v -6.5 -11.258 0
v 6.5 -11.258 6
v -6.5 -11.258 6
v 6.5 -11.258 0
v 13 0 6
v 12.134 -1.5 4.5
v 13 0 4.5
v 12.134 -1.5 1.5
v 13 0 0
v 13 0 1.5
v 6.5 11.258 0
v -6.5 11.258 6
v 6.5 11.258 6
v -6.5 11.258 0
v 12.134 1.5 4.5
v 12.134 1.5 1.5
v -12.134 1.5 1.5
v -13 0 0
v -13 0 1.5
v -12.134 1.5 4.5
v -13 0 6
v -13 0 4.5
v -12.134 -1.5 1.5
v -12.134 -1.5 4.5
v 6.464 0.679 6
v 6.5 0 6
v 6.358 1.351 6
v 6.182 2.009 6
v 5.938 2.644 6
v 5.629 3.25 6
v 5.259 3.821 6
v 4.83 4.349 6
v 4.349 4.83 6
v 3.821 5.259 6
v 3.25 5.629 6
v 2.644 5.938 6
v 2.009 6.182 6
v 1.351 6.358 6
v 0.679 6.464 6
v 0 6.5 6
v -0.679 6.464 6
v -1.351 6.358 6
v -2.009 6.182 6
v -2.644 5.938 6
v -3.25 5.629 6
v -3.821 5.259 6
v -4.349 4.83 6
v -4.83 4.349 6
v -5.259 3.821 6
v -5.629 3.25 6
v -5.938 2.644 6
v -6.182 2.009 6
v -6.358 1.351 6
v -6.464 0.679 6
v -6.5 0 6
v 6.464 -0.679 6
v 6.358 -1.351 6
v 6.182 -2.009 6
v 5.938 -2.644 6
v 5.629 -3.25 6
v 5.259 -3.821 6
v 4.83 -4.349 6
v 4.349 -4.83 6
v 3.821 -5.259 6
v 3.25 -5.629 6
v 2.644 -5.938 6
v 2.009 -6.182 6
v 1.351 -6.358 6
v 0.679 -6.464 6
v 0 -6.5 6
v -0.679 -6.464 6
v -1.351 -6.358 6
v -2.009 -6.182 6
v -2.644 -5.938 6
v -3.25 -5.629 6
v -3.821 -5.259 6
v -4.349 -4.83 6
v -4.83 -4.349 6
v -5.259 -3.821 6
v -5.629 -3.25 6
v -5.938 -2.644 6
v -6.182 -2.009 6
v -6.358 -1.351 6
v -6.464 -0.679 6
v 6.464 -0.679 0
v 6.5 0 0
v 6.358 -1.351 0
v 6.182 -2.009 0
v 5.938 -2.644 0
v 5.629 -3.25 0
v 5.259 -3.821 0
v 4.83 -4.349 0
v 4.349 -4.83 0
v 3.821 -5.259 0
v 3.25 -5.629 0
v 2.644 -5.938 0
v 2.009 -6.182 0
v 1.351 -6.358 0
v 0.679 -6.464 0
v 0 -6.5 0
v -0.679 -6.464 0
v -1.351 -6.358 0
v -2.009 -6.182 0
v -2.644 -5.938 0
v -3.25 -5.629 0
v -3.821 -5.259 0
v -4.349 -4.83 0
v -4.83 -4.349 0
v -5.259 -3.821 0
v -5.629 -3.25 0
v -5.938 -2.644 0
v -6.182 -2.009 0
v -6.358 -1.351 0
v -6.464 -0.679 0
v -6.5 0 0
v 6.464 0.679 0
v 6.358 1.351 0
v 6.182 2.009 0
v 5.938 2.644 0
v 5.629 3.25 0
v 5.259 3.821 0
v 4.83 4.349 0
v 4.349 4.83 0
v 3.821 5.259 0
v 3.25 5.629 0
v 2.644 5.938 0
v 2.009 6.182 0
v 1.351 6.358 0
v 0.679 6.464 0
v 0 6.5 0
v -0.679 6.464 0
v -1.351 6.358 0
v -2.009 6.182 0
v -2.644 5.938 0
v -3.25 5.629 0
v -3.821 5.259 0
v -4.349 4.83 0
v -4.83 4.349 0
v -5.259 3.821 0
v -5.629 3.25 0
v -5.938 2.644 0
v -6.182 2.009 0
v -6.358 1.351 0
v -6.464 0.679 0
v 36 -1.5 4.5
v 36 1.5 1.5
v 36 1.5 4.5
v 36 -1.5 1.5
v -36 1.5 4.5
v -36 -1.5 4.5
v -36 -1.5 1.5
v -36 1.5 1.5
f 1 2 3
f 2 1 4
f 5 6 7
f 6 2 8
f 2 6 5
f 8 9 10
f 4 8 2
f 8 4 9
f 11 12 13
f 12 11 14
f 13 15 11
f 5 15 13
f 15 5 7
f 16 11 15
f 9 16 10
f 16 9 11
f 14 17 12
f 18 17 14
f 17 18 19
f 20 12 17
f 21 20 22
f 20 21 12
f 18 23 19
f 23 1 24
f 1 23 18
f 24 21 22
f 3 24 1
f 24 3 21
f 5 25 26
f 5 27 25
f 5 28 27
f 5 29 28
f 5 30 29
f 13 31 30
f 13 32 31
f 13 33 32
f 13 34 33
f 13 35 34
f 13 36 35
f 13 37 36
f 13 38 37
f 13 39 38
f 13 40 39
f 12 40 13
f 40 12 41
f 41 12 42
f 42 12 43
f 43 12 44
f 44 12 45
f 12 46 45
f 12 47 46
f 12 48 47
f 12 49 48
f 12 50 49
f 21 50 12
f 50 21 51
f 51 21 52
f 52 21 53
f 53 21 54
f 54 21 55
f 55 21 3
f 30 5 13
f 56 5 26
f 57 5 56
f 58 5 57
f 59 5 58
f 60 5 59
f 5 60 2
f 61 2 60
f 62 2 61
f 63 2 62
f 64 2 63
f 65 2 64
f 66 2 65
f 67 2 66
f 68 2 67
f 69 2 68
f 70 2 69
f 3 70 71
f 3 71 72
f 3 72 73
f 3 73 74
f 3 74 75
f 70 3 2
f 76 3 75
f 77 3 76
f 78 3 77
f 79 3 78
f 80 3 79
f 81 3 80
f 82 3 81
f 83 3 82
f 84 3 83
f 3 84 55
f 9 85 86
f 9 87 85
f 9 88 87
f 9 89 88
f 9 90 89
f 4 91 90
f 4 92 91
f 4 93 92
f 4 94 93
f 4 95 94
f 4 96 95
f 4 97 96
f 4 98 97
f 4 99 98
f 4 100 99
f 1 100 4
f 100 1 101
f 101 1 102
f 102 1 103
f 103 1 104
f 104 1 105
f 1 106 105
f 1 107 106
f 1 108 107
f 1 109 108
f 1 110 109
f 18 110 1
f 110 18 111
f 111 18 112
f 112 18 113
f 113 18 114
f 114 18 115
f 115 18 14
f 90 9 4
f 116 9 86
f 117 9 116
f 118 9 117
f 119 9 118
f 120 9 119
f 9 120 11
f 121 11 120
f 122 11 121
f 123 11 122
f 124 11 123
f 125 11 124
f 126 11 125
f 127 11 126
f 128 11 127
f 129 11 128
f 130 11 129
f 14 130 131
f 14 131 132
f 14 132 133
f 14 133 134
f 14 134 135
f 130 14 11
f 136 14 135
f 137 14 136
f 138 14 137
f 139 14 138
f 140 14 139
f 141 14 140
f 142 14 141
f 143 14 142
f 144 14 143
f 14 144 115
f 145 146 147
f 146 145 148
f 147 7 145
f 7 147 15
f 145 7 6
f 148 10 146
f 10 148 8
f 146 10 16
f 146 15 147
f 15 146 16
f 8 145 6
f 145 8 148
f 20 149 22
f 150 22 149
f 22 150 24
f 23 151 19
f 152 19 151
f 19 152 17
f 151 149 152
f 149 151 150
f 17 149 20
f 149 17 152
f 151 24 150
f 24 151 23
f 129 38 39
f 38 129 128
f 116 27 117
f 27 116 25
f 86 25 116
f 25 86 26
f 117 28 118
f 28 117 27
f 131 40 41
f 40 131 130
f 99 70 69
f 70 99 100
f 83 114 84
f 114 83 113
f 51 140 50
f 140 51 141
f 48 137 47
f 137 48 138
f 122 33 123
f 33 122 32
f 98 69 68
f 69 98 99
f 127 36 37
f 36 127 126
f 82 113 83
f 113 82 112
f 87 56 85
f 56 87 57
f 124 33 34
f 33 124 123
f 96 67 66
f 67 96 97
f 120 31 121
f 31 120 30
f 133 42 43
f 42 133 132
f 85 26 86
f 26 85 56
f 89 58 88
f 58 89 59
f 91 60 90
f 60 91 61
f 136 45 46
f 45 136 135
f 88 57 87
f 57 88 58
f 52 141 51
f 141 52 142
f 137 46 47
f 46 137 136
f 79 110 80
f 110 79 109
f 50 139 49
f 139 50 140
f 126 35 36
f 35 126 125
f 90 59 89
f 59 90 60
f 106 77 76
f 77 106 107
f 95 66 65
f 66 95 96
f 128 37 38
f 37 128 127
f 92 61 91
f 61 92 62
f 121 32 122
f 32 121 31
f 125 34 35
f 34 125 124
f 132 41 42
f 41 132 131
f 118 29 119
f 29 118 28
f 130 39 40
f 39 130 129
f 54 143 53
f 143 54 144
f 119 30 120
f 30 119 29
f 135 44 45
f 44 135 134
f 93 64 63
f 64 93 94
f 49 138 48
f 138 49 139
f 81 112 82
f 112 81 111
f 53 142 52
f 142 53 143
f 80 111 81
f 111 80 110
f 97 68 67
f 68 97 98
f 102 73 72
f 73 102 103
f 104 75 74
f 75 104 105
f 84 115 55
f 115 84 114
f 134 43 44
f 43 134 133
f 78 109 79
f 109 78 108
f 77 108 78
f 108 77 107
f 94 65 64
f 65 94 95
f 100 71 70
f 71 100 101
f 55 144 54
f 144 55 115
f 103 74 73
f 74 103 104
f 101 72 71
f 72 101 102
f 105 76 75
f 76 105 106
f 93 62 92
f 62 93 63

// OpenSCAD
// Wing nut with two reinforced wings.
$fn = 60;
eps = 0.02;
thread_d = 13;
body_d = 26;
body_h = 6;
wing_l = 24;
wing_t = 3;
difference() {
    union() {
        cylinder(d = body_d, h = body_h, $fn = 6);
        translate([body_d / 2 - 1, -wing_t / 2, body_h / 2 - wing_t / 2]) cube([wing_l, wing_t, wing_t]);
        translate([-body_d / 2 - wing_l + 1, -wing_t / 2, body_h / 2 - wing_t / 2]) cube([wing_l, wing_t, wing_t]);
    }
    translate([0, 0, -eps]) cylinder(d = thread_d, h = body_h + 2 * eps);
}
